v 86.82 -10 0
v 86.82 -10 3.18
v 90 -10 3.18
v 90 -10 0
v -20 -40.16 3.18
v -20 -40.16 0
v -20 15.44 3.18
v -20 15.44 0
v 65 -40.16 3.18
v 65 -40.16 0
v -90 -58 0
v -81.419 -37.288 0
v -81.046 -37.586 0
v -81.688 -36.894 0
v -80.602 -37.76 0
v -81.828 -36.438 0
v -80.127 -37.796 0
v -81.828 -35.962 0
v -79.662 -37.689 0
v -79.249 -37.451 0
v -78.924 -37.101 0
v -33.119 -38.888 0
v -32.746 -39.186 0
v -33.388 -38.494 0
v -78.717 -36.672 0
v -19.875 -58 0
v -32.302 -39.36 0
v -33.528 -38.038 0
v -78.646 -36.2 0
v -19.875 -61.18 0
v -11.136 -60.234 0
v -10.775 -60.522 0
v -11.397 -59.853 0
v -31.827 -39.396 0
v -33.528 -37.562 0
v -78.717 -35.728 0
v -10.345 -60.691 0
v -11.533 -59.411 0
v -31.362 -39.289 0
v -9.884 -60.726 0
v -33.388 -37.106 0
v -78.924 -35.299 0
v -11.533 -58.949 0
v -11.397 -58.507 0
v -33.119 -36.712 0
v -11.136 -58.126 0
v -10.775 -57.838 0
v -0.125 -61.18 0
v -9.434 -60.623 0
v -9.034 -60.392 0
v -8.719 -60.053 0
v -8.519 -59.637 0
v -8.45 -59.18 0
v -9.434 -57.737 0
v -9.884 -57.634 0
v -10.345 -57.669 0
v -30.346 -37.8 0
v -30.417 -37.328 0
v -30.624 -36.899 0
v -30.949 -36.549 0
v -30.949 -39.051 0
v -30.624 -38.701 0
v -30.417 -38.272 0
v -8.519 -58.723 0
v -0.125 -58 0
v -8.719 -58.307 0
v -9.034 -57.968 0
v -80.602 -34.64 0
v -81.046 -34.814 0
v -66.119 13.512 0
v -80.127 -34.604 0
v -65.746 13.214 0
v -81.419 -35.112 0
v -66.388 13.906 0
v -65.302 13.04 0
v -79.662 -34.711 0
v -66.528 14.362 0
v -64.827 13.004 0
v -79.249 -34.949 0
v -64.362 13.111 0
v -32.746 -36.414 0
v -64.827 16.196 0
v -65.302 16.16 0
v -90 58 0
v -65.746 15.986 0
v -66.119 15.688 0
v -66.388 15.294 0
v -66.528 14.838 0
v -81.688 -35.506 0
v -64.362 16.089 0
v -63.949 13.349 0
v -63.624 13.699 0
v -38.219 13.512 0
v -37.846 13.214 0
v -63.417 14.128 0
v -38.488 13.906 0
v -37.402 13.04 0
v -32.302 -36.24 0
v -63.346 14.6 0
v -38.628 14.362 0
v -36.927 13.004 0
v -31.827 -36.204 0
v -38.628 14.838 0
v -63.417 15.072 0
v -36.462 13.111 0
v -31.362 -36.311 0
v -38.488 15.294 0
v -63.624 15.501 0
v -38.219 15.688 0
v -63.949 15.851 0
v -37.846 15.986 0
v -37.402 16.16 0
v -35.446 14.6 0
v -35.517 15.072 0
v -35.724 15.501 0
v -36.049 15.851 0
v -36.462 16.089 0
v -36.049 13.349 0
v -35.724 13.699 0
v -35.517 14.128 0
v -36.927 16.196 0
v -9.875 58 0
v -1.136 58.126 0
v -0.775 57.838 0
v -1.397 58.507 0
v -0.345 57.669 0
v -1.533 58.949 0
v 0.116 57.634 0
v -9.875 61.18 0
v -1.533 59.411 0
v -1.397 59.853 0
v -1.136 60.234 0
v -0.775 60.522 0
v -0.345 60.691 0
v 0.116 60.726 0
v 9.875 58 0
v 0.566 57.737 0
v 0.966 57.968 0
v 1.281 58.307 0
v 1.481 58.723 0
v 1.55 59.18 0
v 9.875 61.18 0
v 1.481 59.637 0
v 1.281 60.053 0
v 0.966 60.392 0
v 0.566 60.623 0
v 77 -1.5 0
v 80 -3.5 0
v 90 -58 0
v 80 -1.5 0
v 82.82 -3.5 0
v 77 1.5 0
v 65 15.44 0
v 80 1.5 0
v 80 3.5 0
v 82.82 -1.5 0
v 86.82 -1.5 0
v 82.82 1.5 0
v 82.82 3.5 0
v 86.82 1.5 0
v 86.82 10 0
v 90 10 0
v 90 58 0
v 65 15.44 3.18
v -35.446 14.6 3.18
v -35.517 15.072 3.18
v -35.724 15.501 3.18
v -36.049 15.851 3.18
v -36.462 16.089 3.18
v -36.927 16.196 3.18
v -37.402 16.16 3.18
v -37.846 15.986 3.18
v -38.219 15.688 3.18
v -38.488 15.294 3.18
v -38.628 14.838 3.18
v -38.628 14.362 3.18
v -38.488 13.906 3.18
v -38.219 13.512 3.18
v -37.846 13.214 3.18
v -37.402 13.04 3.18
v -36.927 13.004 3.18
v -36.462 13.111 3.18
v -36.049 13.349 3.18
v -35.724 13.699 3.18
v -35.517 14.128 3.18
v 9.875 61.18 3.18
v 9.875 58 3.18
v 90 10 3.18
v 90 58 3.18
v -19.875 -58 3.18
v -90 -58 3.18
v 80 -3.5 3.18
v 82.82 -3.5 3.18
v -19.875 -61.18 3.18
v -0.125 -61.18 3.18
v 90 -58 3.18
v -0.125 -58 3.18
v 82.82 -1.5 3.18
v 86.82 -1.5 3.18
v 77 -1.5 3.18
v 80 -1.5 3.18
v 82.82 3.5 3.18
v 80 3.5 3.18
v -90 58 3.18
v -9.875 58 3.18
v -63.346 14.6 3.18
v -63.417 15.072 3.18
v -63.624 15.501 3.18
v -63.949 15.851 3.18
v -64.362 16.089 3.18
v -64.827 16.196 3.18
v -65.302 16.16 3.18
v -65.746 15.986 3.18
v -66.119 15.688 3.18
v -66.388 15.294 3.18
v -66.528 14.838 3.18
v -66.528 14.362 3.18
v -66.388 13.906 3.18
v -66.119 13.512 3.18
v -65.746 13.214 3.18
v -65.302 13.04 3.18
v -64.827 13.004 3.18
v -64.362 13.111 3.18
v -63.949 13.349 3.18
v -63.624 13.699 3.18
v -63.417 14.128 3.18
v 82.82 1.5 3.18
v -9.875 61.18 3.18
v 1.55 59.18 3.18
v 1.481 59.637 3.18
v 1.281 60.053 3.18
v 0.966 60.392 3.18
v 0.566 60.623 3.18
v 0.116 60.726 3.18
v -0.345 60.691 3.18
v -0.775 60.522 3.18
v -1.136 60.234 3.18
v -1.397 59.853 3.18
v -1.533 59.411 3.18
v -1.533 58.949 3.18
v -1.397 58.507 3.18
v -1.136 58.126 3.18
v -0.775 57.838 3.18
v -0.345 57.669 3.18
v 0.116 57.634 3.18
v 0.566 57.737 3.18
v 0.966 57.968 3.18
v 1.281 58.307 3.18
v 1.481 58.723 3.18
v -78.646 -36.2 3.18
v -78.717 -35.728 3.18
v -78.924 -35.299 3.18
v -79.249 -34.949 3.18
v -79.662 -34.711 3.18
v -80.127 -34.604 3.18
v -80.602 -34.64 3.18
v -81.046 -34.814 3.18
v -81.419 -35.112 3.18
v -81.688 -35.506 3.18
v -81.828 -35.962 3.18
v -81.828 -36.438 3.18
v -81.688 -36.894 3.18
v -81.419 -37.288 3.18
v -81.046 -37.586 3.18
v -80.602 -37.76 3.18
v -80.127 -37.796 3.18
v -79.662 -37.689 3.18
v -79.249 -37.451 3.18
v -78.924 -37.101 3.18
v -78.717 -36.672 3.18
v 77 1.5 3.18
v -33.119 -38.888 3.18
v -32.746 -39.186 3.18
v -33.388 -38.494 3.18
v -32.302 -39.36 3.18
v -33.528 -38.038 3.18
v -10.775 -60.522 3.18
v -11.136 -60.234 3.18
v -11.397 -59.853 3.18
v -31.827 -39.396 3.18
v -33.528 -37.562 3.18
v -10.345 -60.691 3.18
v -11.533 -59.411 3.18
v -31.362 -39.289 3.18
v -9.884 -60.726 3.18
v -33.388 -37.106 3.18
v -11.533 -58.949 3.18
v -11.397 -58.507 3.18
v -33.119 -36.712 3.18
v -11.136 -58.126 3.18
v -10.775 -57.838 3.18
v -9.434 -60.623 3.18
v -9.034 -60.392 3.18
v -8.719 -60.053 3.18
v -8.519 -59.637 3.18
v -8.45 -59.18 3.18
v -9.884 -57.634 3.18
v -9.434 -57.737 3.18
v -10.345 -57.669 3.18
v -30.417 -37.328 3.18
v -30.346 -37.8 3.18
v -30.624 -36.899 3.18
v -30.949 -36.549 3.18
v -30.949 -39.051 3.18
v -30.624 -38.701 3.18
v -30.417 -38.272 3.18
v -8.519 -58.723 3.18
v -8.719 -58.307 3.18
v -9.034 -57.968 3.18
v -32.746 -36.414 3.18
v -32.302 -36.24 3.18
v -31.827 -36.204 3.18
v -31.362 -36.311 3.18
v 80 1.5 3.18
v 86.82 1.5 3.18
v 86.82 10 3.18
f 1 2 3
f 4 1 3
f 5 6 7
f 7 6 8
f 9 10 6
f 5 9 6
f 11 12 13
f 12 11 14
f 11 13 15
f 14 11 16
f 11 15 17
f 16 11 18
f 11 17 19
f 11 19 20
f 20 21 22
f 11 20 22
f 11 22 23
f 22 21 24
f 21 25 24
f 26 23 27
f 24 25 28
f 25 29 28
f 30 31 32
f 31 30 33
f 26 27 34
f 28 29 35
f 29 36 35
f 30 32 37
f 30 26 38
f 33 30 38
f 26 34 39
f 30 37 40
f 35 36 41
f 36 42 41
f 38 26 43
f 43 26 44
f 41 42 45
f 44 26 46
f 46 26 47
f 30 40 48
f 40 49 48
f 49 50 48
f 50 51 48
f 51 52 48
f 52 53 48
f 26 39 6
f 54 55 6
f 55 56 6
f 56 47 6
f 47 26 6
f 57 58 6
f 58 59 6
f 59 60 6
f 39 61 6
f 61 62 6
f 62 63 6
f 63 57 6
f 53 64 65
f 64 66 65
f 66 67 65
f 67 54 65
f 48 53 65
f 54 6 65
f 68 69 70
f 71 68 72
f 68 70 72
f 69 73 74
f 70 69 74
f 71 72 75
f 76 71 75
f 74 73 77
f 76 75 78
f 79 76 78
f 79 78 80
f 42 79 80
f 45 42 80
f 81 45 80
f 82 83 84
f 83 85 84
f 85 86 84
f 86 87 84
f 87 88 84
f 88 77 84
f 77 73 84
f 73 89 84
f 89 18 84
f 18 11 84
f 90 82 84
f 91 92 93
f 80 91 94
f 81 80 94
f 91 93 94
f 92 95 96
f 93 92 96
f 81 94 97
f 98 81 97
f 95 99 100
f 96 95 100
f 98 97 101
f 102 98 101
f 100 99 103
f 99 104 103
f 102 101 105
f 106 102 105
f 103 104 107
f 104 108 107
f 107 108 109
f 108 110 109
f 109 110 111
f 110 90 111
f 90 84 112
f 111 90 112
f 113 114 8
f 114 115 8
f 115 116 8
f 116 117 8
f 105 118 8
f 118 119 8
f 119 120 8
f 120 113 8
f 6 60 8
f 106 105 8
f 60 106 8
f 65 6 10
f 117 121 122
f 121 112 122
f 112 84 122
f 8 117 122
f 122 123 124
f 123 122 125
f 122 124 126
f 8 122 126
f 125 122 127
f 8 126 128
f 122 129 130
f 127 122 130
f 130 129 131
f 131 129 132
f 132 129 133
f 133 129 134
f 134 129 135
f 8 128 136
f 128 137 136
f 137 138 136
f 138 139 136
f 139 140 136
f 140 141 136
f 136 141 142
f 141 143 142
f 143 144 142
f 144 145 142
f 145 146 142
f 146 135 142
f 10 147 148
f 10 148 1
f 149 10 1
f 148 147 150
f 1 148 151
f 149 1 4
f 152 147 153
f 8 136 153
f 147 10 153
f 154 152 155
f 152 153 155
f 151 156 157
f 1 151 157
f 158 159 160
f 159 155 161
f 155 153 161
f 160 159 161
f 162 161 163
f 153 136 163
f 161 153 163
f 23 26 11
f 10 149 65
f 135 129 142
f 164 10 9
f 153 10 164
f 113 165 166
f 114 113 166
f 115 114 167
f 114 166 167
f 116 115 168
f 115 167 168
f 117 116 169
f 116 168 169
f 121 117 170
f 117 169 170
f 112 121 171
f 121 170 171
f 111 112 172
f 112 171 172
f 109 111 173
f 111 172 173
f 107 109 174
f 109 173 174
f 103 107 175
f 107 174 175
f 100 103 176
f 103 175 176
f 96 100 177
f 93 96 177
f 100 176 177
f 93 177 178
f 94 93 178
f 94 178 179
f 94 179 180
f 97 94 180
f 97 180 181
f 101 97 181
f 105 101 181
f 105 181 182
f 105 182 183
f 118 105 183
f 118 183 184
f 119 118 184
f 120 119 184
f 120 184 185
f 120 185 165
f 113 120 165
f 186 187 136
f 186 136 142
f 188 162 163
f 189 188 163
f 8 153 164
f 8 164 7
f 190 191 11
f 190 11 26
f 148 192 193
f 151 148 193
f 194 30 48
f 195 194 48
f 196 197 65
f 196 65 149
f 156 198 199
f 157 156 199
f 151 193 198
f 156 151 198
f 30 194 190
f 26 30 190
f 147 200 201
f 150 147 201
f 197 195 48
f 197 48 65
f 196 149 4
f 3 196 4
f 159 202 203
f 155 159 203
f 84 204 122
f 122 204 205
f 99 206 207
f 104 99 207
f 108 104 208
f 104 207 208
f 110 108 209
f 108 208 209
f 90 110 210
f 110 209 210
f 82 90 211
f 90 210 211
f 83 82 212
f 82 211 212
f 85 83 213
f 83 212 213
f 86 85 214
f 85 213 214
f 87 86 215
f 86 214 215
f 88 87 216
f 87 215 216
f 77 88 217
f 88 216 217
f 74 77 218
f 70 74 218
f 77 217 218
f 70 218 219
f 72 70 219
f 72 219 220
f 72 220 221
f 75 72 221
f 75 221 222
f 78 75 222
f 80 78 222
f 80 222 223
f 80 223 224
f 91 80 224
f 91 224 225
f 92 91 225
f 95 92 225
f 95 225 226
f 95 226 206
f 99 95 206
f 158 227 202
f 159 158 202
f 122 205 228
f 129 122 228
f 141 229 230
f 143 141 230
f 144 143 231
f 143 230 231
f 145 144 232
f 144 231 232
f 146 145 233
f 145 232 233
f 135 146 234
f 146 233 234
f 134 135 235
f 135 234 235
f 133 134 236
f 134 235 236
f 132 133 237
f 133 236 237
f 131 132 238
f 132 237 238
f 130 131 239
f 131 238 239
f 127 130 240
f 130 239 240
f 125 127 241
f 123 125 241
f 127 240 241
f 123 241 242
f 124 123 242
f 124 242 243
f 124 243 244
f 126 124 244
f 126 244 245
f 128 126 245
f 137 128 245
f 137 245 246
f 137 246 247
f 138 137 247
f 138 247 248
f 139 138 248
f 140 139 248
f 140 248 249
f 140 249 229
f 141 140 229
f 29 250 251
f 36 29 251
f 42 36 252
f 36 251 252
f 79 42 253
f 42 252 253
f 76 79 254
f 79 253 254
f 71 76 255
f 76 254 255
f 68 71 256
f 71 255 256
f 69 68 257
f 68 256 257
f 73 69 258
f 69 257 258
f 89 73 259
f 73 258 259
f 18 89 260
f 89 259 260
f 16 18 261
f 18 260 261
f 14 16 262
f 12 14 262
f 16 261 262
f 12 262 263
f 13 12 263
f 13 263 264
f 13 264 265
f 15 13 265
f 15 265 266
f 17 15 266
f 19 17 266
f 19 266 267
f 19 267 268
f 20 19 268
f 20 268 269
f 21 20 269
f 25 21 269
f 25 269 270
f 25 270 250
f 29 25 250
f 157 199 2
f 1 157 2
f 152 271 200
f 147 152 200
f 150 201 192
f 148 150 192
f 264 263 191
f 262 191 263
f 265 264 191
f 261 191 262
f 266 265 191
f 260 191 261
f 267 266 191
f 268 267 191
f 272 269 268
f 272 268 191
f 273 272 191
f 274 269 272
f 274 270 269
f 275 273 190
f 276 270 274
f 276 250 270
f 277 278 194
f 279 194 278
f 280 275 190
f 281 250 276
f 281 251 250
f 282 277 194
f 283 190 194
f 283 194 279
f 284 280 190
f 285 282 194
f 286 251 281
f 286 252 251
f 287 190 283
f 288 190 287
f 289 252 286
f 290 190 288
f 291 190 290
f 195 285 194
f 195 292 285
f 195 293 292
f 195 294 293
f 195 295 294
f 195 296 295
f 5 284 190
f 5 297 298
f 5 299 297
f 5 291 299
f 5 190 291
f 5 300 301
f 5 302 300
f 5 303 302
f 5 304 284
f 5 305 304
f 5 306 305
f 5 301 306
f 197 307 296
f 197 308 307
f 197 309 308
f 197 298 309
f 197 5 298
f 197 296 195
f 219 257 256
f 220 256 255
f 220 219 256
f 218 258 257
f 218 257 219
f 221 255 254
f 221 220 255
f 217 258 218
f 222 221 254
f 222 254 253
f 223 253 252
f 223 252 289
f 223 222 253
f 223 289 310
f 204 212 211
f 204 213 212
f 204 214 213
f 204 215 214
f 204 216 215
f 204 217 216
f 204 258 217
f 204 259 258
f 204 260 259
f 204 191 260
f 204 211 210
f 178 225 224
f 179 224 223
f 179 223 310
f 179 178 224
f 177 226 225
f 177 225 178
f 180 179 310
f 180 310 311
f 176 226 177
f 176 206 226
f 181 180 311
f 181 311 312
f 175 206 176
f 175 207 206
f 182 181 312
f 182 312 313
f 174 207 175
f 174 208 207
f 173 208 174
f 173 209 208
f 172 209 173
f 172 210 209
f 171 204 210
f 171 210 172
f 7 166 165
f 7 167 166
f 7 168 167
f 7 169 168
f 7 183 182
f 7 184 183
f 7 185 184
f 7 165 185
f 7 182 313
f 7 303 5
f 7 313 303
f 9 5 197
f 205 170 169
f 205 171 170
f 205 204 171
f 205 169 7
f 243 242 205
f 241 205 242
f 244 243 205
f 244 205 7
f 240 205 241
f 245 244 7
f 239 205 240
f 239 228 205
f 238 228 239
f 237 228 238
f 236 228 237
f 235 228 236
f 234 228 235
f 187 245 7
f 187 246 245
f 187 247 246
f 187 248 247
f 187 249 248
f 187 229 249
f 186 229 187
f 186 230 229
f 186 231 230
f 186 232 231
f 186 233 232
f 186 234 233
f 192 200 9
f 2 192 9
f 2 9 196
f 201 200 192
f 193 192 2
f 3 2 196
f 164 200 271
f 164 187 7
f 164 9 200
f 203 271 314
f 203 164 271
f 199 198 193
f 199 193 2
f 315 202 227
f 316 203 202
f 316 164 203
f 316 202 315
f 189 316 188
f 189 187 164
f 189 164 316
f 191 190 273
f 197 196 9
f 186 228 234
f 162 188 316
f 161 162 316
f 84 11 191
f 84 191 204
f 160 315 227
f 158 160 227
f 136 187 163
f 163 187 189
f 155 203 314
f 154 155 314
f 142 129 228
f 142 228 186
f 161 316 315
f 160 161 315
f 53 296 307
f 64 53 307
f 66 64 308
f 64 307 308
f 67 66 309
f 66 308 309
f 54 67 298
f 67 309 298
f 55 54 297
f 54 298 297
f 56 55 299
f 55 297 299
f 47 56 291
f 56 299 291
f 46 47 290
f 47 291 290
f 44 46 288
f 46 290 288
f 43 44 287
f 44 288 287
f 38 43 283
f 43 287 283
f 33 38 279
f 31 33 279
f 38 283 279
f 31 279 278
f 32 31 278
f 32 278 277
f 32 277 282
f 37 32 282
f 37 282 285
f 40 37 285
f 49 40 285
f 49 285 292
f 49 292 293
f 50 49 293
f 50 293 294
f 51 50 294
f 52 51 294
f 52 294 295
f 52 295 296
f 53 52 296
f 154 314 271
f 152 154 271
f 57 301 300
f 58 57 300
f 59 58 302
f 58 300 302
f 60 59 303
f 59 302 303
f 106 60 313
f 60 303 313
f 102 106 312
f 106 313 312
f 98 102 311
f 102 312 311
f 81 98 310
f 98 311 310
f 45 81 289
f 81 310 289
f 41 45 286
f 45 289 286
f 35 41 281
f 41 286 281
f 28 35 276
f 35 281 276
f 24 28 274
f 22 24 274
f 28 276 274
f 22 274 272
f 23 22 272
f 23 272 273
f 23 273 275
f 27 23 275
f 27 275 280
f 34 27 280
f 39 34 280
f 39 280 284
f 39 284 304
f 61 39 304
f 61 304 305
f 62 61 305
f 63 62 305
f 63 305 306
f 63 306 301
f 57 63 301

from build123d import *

# Parameters (mm, degrees)
SKETCH1_W               = 180
SKETCH1_H               = 122.36
BOSS_EXTRUDE1_DEPTH     = 3.18
CUT_EXTRUDE1_DEPTH      = 1
CUT_EXTRUDE1_DEPTH_BACK = 4.18
SKETCH3_W               = 70.125
SKETCH3_H               = 3.18
SKETCH3_W_2             = 90.125
CUT_EXTRUDE2_DEPTH      = 1
CUT_EXTRUDE2_DEPTH_BACK = 4.18
SKETCH4_R               = 1.55
CUT_EXTRUDE3_DEPTH      = 1
CUT_EXTRUDE3_DEPTH_BACK = 4.18
SKETCH6_R               = 1.6
CUT_EXTRUDE4_DEPTH      = 1
CUT_EXTRUDE4_DEPTH_BACK = 4.18
SKETCH7_W               = 85
SKETCH7_H               = 55.6
CUT_EXTRUDE5_DEPTH      = 1
CUT_EXTRUDE5_DEPTH_BACK = 4.18
SKETCH8_W               = 80.125
SKETCH8_H               = 3.18
CUT_EXTRUDE6_DEPTH      = 1
CUT_EXTRUDE6_DEPTH_BACK = 4.18
SKETCH9_R               = 1.55
CUT_EXTRUDE7_DEPTH      = 1
CUT_EXTRUDE7_DEPTH_BACK = 4.18


with BuildPart() as part:
    # Sketch1 → Boss-Extrude1 (new body)
    with BuildSketch(Plane.XY):
        Rectangle(SKETCH1_W, SKETCH1_H)
    extrude(amount=BOSS_EXTRUDE1_DEPTH)

    # Sketch2 → Cut-Extrude1 (cut, two sides)
    with BuildSketch(Plane.XY.offset(3.18)) as cut_extrude1_sk:
        Polygon((80, 1.5), (77, 1.5), (77, -1.5), (80, -1.5), (80, -3.5), (82.82, -3.5), (82.82, -1.5), (86.82, -1.5), (86.82, -10), (90, -10), (90, 10), (86.82, 10), (86.82, 1.5), (82.82, 1.5), (82.82, 3.5), (80, 3.5), align=None)
    extrude(amount=CUT_EXTRUDE1_DEPTH, mode=Mode.SUBTRACT)
    extrude(cut_extrude1_sk.sketch, amount=-CUT_EXTRUDE1_DEPTH_BACK, mode=Mode.SUBTRACT)

    # Sketch3 → Cut-Extrude2 (cut, two sides)
    with BuildSketch(Plane.XY.offset(3.18)) as cut_extrude2_sk:
        with Locations((-54.9375, -59.59)):
            Rectangle(SKETCH3_W, SKETCH3_H)
        with Locations((44.9375, -59.59)):
            Rectangle(SKETCH3_W_2, SKETCH3_H)
    extrude(amount=CUT_EXTRUDE2_DEPTH, mode=Mode.SUBTRACT)
    extrude(cut_extrude2_sk.sketch, amount=-CUT_EXTRUDE2_DEPTH_BACK, mode=Mode.SUBTRACT)

    # Sketch4 → Cut-Extrude3 (cut, two sides)
    with BuildSketch(Plane.XY.offset(3.18)) as cut_extrude3_sk:
        with Locations((-10, -59.18)):
            Circle(SKETCH4_R)
    extrude(amount=CUT_EXTRUDE3_DEPTH, mode=Mode.SUBTRACT)
    extrude(cut_extrude3_sk.sketch, amount=-CUT_EXTRUDE3_DEPTH_BACK, mode=Mode.SUBTRACT)

    # Sketch6 → Cut-Extrude4 (cut, two sides)
    with BuildSketch(Plane.XY.offset(3.18)) as cut_extrude4_sk:
        with Locations((-64.946313591, 14.6)):
            Circle(SKETCH6_R)
        with Locations((-80.246313591, -36.2)):
            Circle(SKETCH6_R)
        with Locations((-31.946313591, -37.8)):
            Circle(SKETCH6_R)
        with Locations((-37.046313591, 14.6)):
            Circle(SKETCH6_R)
    extrude(amount=CUT_EXTRUDE4_DEPTH, mode=Mode.SUBTRACT)
    extrude(cut_extrude4_sk.sketch, amount=-CUT_EXTRUDE4_DEPTH_BACK, mode=Mode.SUBTRACT)

    # Sketch7 → Cut-Extrude5 (cut, two sides)
    with BuildSketch(Plane(origin=(0, 0, 0), x_dir=(-1, 0, 0), z_dir=(0, 0, -1))) as cut_extrude5_sk:
        with Locations((-22.5, -12.359811841)):
            Rectangle(SKETCH7_W, SKETCH7_H)
    extrude(amount=CUT_EXTRUDE5_DEPTH, mode=Mode.SUBTRACT)
    extrude(cut_extrude5_sk.sketch, amount=-CUT_EXTRUDE5_DEPTH_BACK, mode=Mode.SUBTRACT)

    # Sketch8 → Cut-Extrude6 (cut, two sides)
    with BuildSketch(Plane.XY.offset(3.18)) as cut_extrude6_sk:
        with Locations((-49.9375, 59.59)):
            Rectangle(SKETCH8_W, SKETCH8_H)
        with Locations((49.9375, 59.59)):
            Rectangle(SKETCH8_W, SKETCH8_H)
    extrude(amount=CUT_EXTRUDE6_DEPTH, mode=Mode.SUBTRACT)
    extrude(cut_extrude6_sk.sketch, amount=-CUT_EXTRUDE6_DEPTH_BACK, mode=Mode.SUBTRACT)

    # Sketch9 → Cut-Extrude7 (cut, two sides)
    with BuildSketch(Plane.XY.offset(3.18)) as cut_extrude7_sk:
        with Locations((0, 59.18)):
            Circle(SKETCH9_R)
    extrude(amount=CUT_EXTRUDE7_DEPTH, mode=Mode.SUBTRACT)
    extrude(cut_extrude7_sk.sketch, amount=-CUT_EXTRUDE7_DEPTH_BACK, mode=Mode.SUBTRACT)


solid = part.part
